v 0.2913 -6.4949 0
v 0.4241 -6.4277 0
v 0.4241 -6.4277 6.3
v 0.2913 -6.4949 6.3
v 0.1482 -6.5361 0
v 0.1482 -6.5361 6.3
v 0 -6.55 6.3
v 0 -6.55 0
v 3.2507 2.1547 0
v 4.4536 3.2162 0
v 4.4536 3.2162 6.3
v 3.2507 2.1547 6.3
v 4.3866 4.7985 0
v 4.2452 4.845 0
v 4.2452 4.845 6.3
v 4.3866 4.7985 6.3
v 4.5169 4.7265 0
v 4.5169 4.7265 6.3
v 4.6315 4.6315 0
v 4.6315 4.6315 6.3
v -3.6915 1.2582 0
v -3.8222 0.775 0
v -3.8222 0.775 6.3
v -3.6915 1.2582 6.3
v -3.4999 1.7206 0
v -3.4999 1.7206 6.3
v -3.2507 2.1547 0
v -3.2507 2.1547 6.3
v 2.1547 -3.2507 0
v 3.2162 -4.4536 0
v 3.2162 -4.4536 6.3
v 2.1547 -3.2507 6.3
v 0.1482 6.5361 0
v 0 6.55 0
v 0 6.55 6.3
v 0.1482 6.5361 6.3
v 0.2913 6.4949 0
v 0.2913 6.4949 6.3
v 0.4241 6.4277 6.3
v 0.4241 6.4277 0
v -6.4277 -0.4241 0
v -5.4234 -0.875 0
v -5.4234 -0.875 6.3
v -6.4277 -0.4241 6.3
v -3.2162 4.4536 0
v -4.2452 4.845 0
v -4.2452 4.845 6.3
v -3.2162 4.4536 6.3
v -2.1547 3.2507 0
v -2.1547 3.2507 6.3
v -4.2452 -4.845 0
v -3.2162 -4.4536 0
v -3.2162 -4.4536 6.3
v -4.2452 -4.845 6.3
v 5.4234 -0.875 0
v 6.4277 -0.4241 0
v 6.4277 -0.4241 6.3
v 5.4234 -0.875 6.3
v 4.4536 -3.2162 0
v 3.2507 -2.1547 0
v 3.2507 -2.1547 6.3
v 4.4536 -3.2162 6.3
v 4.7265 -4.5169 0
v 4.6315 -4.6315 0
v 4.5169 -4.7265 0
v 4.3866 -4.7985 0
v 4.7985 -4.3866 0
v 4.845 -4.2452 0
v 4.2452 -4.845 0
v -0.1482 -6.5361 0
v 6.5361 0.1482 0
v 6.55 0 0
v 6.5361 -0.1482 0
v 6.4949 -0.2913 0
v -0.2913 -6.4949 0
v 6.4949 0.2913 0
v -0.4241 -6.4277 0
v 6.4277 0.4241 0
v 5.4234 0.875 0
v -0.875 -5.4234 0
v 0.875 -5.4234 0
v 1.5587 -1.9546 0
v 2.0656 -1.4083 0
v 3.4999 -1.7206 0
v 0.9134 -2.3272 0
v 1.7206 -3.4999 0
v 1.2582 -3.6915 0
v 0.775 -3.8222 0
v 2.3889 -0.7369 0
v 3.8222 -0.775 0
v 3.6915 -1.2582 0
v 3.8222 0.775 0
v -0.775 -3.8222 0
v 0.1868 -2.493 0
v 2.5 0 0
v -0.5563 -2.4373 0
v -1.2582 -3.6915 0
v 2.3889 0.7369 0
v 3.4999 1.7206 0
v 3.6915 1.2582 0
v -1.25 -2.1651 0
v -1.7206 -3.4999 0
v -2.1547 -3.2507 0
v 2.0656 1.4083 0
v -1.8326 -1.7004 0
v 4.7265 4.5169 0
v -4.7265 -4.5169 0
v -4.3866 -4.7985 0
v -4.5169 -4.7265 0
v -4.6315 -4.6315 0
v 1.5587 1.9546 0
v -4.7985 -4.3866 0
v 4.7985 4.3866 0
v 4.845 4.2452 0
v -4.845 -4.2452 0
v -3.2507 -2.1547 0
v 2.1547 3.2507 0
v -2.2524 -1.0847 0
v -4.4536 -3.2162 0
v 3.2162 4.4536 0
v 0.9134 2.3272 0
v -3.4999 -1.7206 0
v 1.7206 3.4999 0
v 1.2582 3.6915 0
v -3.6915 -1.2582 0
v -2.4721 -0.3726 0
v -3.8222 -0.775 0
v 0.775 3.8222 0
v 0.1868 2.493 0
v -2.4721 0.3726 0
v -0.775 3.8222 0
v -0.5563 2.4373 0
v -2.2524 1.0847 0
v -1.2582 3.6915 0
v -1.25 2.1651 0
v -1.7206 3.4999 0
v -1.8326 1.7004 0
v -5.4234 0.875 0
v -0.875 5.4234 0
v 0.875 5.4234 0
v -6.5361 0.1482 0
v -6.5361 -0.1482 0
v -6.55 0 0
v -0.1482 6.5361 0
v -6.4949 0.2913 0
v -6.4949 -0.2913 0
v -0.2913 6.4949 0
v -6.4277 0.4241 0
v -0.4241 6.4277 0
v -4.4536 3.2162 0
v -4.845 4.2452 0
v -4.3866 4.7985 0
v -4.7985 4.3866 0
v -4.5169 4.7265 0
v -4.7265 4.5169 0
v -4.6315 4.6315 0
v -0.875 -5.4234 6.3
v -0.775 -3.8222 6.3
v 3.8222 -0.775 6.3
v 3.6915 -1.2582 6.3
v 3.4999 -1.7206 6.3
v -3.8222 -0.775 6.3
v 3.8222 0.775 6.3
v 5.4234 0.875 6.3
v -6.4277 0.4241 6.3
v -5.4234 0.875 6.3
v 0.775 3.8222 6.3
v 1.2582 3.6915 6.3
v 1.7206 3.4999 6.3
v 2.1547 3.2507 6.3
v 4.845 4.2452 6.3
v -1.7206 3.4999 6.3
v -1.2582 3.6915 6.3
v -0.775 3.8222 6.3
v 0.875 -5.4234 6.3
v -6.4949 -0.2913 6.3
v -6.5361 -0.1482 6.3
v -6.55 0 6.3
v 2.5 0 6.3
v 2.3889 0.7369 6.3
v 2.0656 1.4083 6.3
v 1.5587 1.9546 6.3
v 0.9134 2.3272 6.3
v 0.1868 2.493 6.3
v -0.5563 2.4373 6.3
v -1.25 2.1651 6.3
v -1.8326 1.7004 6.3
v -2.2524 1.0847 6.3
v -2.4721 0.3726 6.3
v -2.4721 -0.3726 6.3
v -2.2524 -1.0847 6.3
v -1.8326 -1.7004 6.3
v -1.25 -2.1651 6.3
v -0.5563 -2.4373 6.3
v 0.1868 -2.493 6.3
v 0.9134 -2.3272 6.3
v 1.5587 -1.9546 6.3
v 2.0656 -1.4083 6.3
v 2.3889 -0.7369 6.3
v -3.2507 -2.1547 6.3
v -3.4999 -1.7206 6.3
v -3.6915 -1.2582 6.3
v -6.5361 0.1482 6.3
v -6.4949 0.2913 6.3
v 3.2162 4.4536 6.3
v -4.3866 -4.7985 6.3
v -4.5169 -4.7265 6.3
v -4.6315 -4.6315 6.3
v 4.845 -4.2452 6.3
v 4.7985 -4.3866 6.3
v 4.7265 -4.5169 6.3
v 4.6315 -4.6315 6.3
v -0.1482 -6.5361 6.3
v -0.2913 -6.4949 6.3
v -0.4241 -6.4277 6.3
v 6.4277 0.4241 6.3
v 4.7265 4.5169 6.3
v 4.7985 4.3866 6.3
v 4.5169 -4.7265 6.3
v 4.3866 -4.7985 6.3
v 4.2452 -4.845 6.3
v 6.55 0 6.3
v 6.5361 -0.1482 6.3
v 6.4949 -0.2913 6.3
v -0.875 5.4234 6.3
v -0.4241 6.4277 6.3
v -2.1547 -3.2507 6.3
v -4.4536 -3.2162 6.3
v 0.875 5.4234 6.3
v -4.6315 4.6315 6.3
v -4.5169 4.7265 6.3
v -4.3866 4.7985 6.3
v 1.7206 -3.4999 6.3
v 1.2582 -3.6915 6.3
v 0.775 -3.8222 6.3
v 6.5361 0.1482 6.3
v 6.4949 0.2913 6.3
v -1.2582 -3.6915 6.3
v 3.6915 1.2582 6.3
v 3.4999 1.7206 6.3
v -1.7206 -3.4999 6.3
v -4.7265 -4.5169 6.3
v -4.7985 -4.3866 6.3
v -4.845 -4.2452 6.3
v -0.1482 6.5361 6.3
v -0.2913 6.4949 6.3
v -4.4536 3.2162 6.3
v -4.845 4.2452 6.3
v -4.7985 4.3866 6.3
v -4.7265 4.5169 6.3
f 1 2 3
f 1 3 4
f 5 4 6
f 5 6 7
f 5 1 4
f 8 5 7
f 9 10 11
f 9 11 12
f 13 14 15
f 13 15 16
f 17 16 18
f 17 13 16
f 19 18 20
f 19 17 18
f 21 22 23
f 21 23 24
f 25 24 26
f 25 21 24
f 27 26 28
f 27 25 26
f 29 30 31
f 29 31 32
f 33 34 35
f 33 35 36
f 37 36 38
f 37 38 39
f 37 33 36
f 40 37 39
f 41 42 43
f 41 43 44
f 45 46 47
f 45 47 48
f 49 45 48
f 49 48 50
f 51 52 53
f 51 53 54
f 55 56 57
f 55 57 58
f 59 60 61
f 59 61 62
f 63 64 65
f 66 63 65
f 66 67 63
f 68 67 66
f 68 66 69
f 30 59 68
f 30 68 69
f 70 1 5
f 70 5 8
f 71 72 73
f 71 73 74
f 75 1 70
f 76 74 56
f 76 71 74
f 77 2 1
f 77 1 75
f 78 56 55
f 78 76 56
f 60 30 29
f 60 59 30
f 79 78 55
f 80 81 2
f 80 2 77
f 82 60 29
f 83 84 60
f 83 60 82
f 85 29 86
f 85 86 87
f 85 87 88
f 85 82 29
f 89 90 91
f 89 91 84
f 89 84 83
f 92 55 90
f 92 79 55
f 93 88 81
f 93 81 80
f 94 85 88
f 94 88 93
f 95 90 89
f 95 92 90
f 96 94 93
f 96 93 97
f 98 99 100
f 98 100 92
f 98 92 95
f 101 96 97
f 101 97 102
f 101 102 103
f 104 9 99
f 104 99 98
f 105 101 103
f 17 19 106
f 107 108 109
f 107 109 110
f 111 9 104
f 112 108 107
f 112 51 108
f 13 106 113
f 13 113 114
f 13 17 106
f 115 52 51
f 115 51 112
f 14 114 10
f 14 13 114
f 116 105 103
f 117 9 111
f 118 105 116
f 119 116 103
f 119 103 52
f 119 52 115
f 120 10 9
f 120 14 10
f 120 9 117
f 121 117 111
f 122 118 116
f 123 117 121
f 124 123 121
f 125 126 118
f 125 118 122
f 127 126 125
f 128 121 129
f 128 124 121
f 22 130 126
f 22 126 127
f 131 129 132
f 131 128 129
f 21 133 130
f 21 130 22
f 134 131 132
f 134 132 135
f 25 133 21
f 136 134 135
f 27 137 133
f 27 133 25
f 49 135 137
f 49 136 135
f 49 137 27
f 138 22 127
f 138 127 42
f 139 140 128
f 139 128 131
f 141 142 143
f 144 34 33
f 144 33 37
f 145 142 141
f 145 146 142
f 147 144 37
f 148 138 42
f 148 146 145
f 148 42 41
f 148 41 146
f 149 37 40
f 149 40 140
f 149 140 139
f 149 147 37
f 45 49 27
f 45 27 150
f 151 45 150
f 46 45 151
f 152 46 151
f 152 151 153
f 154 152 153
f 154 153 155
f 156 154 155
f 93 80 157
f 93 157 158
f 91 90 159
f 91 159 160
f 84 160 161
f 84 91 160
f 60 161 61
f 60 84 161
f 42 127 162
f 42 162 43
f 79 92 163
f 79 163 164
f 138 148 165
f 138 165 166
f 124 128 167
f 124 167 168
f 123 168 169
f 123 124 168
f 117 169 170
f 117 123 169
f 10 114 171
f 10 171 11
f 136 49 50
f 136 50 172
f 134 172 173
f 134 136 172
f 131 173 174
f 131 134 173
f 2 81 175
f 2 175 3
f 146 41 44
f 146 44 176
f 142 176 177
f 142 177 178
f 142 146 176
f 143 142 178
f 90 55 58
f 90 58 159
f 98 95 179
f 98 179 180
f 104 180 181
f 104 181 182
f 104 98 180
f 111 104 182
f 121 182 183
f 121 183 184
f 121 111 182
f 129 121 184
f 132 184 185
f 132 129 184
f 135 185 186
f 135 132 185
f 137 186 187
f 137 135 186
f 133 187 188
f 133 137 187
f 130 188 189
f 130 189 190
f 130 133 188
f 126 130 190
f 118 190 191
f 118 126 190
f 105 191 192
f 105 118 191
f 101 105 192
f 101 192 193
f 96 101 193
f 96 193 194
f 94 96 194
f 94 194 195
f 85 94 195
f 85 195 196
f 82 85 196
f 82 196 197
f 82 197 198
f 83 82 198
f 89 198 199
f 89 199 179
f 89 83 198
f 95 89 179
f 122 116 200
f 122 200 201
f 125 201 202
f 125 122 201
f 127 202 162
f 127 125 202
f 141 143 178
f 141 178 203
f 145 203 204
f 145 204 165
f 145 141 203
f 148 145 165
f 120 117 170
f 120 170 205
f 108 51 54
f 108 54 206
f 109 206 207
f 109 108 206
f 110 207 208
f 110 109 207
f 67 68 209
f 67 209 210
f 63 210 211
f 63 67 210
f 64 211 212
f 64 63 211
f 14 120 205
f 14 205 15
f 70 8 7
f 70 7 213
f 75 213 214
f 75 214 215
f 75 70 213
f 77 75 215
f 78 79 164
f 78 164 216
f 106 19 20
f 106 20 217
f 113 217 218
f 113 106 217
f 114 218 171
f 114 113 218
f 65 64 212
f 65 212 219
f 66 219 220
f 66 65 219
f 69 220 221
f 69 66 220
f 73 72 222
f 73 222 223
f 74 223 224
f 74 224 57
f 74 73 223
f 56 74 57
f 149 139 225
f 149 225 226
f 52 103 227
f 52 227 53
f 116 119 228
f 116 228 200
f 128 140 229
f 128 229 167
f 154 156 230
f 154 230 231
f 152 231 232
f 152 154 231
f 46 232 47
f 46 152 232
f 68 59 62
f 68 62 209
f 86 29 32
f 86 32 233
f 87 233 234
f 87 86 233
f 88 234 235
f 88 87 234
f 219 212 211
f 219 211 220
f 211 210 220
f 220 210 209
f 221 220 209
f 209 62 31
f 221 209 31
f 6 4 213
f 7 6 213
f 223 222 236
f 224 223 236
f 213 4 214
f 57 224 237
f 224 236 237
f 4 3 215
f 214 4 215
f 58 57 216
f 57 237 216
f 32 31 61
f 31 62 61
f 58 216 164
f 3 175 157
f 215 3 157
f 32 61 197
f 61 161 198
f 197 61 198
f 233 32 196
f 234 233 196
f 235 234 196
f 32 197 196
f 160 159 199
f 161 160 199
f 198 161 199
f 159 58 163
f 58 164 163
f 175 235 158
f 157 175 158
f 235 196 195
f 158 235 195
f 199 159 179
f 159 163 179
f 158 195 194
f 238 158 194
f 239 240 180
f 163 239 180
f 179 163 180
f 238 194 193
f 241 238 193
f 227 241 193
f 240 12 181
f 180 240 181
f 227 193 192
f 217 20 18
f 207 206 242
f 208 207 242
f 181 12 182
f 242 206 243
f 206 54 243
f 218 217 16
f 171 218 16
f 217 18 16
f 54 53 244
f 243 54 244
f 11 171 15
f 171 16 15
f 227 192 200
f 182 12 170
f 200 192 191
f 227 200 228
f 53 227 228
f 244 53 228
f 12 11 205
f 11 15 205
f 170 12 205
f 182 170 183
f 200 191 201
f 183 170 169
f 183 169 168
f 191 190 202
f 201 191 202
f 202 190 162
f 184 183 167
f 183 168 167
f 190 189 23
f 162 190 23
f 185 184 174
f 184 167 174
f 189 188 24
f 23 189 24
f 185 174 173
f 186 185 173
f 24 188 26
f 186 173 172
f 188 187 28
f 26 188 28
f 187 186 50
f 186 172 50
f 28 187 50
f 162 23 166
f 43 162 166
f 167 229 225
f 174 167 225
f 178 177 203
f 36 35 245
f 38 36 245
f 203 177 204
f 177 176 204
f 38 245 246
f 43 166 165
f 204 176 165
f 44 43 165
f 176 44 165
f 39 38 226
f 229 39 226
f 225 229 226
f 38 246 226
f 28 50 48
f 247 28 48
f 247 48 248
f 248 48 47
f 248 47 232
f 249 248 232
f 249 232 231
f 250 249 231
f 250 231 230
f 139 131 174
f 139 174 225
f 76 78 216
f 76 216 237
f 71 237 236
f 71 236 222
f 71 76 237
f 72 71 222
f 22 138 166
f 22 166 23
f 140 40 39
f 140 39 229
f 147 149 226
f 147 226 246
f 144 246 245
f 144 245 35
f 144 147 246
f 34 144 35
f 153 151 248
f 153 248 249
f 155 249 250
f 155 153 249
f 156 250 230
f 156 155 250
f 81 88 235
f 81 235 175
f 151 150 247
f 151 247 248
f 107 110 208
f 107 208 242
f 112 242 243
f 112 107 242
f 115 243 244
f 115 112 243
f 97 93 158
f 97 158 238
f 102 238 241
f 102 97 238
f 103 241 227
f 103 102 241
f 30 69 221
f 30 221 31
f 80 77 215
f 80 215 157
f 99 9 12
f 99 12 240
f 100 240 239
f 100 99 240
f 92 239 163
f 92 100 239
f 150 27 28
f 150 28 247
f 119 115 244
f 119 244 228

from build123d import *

# Parameters (mm, degrees)
SZKIC1_R                    = 2.5
DODANIE_WYCI_GNI_CIE1_DEPTH = 6.3


with BuildPart() as part:
    # Szkic1 → Dodanie-wyciągnięcie1 (new body)
    with BuildSketch(Plane.XY):
        with BuildLine():
            Line((0.875, 5.423398291), (0.775, 3.822221213))
            ThreePointArc((0.775, 3.822221213), (1.492465386, 3.603130177), (2.154710783, 3.250726294))
            Line((2.154710783, 3.250726294), (3.216203275, 4.453640142))
            Line((3.216203275, 4.453640142), (4.245186445, 4.844987722))
            ThreePointArc((4.245186445, 4.844987722), (4.453444634, 4.765560203), (4.631549417, 4.631549417))
            ThreePointArc((4.631549417, 4.631549417), (4.765560203, 4.453444634), (4.844987722, 4.245186445))
            Line((4.844987722, 4.245186445), (4.453640142, 3.216203275))
            Line((4.453640142, 3.216203275), (3.250726294, 2.154710783))
            ThreePointArc((3.250726294, 2.154710783), (3.603130177, 1.492465386), (3.822221213, 0.775))
            Line((3.822221213, 0.775), (5.423398291, 0.875))
            Line((5.423398291, 0.875), (6.427723795, 0.424123551))
            ThreePointArc((6.427723795, 0.424123551), (6.518820836, 0.220699035), (6.55, 0))
            ThreePointArc((6.55, 0), (6.518820836, -0.220699035), (6.427723795, -0.424123551))
            Line((6.427723795, -0.424123551), (5.423398291, -0.875))
            Line((5.423398291, -0.875), (3.822221213, -0.775))
            ThreePointArc((3.822221213, -0.775), (3.603130177, -1.492465386), (3.250726294, -2.154710783))
            Line((3.250726294, -2.154710783), (4.453640142, -3.216203275))
            Line((4.453640142, -3.216203275), (4.844987722, -4.245186445))
            ThreePointArc((4.844987722, -4.245186445), (4.765560203, -4.453444634), (4.631549417, -4.631549417))
            ThreePointArc((4.631549417, -4.631549417), (4.453444634, -4.765560203), (4.245186445, -4.844987722))
            Line((4.245186445, -4.844987722), (3.216203275, -4.453640142))
            Line((3.216203275, -4.453640142), (2.154710783, -3.250726294))
            ThreePointArc((2.154710783, -3.250726294), (1.492465386, -3.603130177), (0.775, -3.822221213))
            Line((0.775, -3.822221213), (0.875, -5.423398291))
            Line((0.875, -5.423398291), (0.424123551, -6.427723795))
            ThreePointArc((0.424123551, -6.427723795), (0.220699035, -6.518820836), (0, -6.55))
            ThreePointArc((0, -6.55), (-0.220699035, -6.518820836), (-0.424123551, -6.427723795))
            Line((-0.424123551, -6.427723795), (-0.875, -5.423398291))
            Line((-0.875, -5.423398291), (-0.775, -3.822221213))
            ThreePointArc((-0.775, -3.822221213), (-1.492465386, -3.603130177), (-2.154710783, -3.250726294))
            Line((-2.154710783, -3.250726294), (-3.216203275, -4.453640142))
            Line((-3.216203275, -4.453640142), (-4.245186445, -4.844987722))
            ThreePointArc((-4.245186445, -4.844987722), (-4.453444634, -4.765560203), (-4.631549417, -4.631549417))
            ThreePointArc((-4.631549417, -4.631549417), (-4.765560203, -4.453444634), (-4.844987722, -4.245186445))
            Line((-4.844987722, -4.245186445), (-4.453640142, -3.216203275))
            Line((-4.453640142, -3.216203275), (-3.250726294, -2.154710783))
            ThreePointArc((-3.250726294, -2.154710783), (-3.603130177, -1.492465386), (-3.822221213, -0.775))
            Line((-3.822221213, -0.775), (-5.423398291, -0.875))
            Line((-5.423398291, -0.875), (-6.427723795, -0.424123551))
            ThreePointArc((-6.427723795, -0.424123551), (-6.518820836, -0.220699035), (-6.55, 0))
            ThreePointArc((-6.55, 0), (-6.518820836, 0.220699035), (-6.427723795, 0.424123551))
            Line((-6.427723795, 0.424123551), (-5.423398291, 0.875))
            Line((-5.423398291, 0.875), (-3.822221213, 0.775))
            ThreePointArc((-3.822221213, 0.775), (-3.603130177, 1.492465386), (-3.250726294, 2.154710783))
            Line((-3.250726294, 2.154710783), (-4.453640142, 3.216203275))
            Line((-4.453640142, 3.216203275), (-4.844987722, 4.245186445))
            ThreePointArc((-4.844987722, 4.245186445), (-4.765560203, 4.453444634), (-4.631549417, 4.631549417))
            ThreePointArc((-4.631549417, 4.631549417), (-4.453444634, 4.765560203), (-4.245186445, 4.844987722))
            Line((-4.245186445, 4.844987722), (-3.216203275, 4.453640142))
            Line((-3.216203275, 4.453640142), (-2.154710783, 3.250726294))
            ThreePointArc((-2.154710783, 3.250726294), (-1.492465386, 3.603130177), (-0.775, 3.822221213))
            Line((-0.775, 3.822221213), (-0.875, 5.423398291))
            Line((-0.875, 5.423398291), (-0.424123551, 6.427723795))
            ThreePointArc((-0.424123551, 6.427723795), (-0.220699035, 6.518820836), (0, 6.55))
            ThreePointArc((0, 6.55), (0.220699035, 6.518820836), (0.424123551, 6.427723795))
            Line((0.424123551, 6.427723795), (0.875, 5.423398291))
        make_face()
        Circle(SZKIC1_R, mode=Mode.SUBTRACT)
    extrude(amount=DODANIE_WYCI_GNI_CIE1_DEPTH)


solid = part.part
